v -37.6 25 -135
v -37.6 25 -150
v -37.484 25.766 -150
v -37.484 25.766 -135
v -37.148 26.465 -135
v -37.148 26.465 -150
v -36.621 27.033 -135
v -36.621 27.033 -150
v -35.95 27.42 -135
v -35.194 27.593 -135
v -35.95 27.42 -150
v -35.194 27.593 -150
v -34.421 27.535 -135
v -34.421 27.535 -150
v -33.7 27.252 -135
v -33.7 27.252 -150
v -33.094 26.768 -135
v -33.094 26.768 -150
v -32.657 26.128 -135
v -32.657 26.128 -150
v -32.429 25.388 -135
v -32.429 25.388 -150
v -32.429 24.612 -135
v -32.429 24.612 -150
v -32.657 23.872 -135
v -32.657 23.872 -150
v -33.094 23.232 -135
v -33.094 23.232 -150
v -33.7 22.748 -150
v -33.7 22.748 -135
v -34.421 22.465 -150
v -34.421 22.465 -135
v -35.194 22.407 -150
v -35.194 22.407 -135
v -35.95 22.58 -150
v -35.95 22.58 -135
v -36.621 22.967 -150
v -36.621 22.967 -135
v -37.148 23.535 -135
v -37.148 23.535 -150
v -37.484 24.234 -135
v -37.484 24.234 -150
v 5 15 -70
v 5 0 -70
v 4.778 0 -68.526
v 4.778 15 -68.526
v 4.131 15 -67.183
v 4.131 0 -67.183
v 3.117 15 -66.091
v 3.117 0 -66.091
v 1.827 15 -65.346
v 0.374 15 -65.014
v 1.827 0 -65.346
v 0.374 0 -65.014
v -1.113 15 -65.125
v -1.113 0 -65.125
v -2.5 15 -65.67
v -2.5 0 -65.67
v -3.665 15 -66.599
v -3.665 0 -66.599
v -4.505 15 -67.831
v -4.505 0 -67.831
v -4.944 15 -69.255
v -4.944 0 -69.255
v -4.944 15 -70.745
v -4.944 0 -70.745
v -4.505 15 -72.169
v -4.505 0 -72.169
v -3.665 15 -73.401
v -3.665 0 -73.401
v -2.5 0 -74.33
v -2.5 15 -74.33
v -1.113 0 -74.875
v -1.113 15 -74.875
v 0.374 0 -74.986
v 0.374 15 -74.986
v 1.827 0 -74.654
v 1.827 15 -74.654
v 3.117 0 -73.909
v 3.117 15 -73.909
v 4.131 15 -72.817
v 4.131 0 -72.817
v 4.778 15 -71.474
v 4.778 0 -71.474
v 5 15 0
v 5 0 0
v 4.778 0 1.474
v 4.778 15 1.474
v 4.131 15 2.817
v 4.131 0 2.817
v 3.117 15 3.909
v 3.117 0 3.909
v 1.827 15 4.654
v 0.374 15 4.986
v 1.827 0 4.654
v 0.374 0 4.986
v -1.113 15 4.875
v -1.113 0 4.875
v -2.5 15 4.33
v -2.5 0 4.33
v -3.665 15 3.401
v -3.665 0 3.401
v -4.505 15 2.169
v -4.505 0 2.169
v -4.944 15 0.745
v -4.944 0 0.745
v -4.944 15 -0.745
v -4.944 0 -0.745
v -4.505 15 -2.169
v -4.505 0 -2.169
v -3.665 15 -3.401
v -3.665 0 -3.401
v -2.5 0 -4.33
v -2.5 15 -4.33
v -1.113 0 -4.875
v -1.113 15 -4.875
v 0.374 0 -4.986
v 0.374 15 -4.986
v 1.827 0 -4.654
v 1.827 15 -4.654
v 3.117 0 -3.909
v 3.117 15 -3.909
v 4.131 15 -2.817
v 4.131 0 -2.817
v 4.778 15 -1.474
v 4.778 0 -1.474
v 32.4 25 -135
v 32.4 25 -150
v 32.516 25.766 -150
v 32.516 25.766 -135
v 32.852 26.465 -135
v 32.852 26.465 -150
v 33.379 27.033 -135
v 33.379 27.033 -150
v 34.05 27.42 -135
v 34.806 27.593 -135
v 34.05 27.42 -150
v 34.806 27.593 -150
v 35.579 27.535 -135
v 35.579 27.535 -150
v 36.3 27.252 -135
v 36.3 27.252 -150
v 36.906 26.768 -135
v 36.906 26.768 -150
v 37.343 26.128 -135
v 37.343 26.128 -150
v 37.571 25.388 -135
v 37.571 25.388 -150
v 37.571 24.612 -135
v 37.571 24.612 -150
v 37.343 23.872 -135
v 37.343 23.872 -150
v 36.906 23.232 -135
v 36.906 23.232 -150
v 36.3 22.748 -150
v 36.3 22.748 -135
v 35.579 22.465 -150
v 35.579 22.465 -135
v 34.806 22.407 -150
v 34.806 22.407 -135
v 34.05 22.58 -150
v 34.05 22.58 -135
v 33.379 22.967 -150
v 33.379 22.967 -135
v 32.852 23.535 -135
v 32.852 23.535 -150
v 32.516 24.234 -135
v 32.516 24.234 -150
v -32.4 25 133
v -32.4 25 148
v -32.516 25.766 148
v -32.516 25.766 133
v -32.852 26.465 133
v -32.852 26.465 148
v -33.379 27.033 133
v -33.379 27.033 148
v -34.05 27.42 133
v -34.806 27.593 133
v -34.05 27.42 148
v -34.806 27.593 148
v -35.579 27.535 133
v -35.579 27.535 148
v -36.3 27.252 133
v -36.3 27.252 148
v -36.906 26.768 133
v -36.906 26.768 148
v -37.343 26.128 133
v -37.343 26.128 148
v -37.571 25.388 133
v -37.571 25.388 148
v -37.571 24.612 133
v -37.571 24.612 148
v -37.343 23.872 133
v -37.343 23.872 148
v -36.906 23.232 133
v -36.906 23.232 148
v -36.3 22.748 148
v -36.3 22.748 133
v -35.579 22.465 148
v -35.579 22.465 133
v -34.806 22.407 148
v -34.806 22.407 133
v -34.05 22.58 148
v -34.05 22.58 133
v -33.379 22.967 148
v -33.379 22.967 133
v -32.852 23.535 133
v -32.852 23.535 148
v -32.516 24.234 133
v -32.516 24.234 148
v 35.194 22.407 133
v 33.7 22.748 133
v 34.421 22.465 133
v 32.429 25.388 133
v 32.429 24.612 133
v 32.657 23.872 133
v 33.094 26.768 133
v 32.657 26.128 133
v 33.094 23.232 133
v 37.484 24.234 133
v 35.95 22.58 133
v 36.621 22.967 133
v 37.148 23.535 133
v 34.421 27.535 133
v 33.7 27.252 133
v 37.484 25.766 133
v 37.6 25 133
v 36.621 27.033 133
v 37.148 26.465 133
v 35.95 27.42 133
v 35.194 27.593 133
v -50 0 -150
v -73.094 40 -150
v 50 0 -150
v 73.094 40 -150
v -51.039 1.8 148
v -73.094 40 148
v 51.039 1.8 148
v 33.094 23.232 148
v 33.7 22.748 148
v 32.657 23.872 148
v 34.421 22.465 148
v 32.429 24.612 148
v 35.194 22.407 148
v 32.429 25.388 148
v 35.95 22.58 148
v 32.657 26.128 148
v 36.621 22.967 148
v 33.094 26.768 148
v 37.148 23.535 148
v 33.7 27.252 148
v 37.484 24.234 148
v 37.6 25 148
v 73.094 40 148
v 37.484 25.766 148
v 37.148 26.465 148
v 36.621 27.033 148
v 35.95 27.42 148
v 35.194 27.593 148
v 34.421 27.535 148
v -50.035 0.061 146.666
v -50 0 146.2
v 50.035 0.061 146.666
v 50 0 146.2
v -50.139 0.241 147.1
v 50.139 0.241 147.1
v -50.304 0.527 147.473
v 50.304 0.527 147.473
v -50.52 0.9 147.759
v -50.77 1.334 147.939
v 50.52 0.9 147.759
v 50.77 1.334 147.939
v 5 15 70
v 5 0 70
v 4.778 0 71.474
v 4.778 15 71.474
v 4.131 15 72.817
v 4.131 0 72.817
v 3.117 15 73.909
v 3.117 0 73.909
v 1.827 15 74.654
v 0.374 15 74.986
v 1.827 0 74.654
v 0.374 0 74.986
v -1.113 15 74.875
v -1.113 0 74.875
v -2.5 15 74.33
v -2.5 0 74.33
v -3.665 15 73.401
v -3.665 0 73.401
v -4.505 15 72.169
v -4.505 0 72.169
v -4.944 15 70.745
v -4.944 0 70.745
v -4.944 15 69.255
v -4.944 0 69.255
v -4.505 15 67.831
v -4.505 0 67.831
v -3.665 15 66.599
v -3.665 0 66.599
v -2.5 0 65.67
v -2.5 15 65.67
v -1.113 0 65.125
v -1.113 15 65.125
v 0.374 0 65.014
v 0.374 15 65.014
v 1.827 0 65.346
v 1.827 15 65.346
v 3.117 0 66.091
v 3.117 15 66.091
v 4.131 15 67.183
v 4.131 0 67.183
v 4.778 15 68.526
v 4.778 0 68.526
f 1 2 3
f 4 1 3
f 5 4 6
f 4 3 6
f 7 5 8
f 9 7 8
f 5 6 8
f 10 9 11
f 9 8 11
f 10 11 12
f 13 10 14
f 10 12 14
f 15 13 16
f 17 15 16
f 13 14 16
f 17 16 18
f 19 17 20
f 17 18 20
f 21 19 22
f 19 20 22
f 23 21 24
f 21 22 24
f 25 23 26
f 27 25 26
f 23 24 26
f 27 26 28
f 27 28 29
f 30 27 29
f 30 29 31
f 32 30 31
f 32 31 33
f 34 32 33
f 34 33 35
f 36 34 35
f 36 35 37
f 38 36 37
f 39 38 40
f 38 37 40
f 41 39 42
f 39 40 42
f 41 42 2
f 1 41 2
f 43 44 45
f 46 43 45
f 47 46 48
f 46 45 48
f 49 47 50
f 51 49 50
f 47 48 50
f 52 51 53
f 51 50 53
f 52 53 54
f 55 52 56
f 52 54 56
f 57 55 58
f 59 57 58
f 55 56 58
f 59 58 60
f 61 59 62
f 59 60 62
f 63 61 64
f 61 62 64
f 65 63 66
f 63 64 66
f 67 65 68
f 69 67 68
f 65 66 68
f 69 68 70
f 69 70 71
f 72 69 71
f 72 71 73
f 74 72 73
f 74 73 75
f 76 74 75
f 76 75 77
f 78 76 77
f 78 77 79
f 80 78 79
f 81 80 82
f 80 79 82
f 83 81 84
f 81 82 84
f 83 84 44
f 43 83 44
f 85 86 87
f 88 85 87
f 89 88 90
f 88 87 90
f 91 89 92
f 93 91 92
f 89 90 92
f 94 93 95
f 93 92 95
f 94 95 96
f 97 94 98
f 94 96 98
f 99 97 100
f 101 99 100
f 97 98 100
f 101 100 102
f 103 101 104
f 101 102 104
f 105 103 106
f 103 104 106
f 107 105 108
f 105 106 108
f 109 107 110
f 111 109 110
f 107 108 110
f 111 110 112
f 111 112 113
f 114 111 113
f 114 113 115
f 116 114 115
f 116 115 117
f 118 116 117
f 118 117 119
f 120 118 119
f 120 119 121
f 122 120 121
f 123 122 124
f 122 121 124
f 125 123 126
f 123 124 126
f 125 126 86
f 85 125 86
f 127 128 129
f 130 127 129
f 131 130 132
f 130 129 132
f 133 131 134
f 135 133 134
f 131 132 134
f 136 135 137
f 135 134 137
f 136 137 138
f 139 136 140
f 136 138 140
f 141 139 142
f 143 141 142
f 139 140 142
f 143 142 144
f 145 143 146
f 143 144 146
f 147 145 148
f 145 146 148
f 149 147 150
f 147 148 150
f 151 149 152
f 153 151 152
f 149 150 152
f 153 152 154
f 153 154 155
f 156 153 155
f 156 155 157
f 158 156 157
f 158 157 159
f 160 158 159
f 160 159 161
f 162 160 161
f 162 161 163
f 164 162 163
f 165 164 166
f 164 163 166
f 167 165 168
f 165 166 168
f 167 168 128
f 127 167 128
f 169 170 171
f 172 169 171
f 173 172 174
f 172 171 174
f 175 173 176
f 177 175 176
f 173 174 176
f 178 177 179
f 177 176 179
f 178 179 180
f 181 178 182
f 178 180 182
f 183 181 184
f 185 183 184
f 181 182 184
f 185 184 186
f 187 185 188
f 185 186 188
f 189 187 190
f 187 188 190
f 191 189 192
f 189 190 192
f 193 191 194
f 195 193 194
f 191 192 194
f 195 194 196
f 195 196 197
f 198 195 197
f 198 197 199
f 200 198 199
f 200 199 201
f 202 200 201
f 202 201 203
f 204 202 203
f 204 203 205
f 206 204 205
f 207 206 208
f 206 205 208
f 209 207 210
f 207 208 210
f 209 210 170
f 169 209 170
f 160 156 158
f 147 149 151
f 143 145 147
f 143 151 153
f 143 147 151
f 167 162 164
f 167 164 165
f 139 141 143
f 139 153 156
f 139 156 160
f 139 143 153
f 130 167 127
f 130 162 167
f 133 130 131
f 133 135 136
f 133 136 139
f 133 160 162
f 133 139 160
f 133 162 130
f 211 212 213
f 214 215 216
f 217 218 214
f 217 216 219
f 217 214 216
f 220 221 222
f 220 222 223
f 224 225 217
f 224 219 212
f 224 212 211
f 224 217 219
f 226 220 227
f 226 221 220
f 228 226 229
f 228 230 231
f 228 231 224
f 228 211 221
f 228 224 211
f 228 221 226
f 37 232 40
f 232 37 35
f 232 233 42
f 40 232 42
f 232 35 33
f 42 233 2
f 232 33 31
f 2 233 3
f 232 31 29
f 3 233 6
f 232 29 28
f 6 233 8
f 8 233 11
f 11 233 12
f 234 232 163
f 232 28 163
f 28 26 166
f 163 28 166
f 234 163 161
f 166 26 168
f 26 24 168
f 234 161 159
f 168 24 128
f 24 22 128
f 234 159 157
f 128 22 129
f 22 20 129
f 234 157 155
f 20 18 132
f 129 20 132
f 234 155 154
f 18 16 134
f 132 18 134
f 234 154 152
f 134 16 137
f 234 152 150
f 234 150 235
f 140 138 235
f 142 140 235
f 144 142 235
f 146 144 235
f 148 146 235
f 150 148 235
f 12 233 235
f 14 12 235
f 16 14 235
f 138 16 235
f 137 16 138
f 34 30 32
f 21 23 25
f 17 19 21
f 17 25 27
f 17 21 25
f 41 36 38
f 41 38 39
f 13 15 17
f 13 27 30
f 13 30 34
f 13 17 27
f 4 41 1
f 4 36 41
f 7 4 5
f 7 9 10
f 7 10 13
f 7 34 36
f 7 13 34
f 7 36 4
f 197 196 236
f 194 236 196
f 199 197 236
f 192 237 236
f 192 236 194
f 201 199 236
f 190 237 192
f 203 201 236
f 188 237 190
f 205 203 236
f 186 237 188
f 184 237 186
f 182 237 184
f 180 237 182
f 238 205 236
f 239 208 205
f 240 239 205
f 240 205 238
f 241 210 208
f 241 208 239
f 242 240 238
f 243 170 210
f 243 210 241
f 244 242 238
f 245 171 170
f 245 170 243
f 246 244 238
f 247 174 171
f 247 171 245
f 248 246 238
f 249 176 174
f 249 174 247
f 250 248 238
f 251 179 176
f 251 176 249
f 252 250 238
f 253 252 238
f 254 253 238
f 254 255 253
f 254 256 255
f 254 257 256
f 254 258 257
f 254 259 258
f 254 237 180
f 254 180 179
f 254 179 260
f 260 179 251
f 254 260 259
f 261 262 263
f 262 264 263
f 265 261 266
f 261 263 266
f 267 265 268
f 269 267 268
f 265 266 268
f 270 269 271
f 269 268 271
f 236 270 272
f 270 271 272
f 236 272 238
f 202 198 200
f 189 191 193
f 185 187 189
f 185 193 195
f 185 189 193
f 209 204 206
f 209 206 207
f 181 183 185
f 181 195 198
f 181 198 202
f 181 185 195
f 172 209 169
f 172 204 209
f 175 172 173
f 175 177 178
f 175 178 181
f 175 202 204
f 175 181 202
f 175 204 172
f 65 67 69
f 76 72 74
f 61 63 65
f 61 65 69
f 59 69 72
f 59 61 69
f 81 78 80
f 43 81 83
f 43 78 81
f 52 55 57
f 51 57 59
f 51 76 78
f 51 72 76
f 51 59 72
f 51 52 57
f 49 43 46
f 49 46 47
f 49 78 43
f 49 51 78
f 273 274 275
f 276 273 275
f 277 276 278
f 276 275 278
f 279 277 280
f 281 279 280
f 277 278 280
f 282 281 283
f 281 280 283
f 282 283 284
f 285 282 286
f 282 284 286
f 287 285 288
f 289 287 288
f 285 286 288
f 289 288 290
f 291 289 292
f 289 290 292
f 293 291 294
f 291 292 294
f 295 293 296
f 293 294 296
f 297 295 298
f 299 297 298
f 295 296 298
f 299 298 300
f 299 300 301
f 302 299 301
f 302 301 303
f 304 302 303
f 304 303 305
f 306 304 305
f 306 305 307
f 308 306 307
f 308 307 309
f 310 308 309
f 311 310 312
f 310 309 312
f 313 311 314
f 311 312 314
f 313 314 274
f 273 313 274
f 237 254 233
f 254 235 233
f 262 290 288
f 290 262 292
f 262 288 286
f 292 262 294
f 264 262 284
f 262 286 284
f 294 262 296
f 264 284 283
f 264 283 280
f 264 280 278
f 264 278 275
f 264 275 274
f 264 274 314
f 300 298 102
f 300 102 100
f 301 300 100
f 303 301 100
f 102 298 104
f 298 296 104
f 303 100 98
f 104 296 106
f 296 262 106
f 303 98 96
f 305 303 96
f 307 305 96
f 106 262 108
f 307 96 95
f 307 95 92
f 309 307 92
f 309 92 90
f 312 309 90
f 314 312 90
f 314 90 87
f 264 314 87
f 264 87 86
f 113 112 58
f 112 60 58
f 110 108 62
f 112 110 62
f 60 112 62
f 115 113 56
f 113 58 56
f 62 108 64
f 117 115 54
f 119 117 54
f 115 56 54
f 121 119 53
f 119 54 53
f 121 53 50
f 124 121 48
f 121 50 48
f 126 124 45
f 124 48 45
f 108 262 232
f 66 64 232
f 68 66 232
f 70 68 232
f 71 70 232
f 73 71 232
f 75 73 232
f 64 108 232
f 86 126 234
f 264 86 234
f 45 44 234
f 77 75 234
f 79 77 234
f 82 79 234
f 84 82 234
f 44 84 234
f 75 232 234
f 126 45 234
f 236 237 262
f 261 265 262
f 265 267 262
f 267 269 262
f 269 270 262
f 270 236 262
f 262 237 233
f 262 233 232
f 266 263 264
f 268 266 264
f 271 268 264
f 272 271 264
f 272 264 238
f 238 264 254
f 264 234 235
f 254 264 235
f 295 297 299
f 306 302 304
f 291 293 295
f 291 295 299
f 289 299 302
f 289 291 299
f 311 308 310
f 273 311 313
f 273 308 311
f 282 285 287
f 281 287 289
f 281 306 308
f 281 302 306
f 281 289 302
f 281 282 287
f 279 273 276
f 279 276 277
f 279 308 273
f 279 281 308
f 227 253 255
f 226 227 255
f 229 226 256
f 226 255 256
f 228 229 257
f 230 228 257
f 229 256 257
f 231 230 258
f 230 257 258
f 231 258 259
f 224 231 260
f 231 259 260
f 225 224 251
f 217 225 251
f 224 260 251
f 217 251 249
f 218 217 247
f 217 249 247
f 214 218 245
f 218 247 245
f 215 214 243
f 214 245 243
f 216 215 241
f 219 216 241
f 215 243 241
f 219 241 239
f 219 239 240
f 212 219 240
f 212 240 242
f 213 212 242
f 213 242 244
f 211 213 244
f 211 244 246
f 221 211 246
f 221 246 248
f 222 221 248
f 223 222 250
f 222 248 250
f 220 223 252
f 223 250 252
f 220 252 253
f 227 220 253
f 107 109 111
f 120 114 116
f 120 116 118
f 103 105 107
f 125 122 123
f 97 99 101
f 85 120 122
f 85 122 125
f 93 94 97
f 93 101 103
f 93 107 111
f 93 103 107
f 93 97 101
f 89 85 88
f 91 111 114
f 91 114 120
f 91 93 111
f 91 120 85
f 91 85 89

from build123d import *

# Parameters (mm, degrees)
BOSS_EXTRUDE1_DEPTH = 100
SKETCH3_R           = 5
CUT_EXTRUDE2_DEPTH  = 15
BOSS_EXTRUDE5_DEPTH = 50
BOSS_EXTRUDE6_DEPTH = 48
FILLET1_R           = 1.8
SKETCH11_R          = 2.6
CUT_EXTRUDE3_DEPTH  = 15
SKETCH12_R          = 2.6
CUT_EXTRUDE4_DEPTH  = 15


with BuildPart() as part:
    # Sketch1 → Boss-Extrude1 (new body, symmetric)
    with BuildSketch(Plane.XY):
        Polygon((50, 0), (-50, 0), (-73.094010768, 40), (73.094010768, 40), align=None)
    extrude(amount=BOSS_EXTRUDE1_DEPTH, both=True)

    # Sketch3 → Cut-Extrude2 (cut)
    with BuildSketch(Plane.XZ):
        with Locations((0, 70)):
            Circle(SKETCH3_R)
        with Locations((0, -70)):
            Circle(SKETCH3_R)
        Circle(SKETCH3_R)
    extrude(amount=-CUT_EXTRUDE2_DEPTH, mode=Mode.SUBTRACT)

    # Sketch9 → Boss-Extrude5 (add)
    with BuildSketch(Plane(origin=(0, 0, -100), x_dir=(-1, 0, 0), z_dir=(0, 0, -1))):
        Polygon((50, 0), (-50, 0), (-73.094010768, 40), (73.094010768, 40), align=None)
    extrude(amount=BOSS_EXTRUDE5_DEPTH)

    # Sketch10 → Boss-Extrude6 (add)
    with BuildSketch(Plane.XY.offset(100)):
        Polygon((-50, 0), (50, 0), (73.094010768, 40), (-73.094010768, 40), align=None)
    extrude(amount=BOSS_EXTRUDE6_DEPTH)

    # Fillet1
    fillet1_edges = [part.edges().sort_by_distance(p)[0] for p in [
        (0, 0, 148),
    ]]
    fillet(fillet1_edges, radius=FILLET1_R)

    # Sketch11 → Cut-Extrude3 (cut)
    with BuildSketch(Plane.XY.offset(148)):
        with Locations((-35, 25)):
            Circle(SKETCH11_R)
        with Locations((35, 25)):
            Circle(SKETCH11_R)
    extrude(amount=-CUT_EXTRUDE3_DEPTH, mode=Mode.SUBTRACT)

    # Sketch12 → Cut-Extrude4 (cut)
    with BuildSketch(Plane(origin=(0, 0, -150), x_dir=(-1, 0, 0), z_dir=(0, 0, -1))):
        with Locations((-35, 25)):
            Circle(SKETCH12_R)
        with Locations((35, 25)):
            Circle(SKETCH12_R)
    extrude(amount=-CUT_EXTRUDE4_DEPTH, mode=Mode.SUBTRACT)


solid = part.part
